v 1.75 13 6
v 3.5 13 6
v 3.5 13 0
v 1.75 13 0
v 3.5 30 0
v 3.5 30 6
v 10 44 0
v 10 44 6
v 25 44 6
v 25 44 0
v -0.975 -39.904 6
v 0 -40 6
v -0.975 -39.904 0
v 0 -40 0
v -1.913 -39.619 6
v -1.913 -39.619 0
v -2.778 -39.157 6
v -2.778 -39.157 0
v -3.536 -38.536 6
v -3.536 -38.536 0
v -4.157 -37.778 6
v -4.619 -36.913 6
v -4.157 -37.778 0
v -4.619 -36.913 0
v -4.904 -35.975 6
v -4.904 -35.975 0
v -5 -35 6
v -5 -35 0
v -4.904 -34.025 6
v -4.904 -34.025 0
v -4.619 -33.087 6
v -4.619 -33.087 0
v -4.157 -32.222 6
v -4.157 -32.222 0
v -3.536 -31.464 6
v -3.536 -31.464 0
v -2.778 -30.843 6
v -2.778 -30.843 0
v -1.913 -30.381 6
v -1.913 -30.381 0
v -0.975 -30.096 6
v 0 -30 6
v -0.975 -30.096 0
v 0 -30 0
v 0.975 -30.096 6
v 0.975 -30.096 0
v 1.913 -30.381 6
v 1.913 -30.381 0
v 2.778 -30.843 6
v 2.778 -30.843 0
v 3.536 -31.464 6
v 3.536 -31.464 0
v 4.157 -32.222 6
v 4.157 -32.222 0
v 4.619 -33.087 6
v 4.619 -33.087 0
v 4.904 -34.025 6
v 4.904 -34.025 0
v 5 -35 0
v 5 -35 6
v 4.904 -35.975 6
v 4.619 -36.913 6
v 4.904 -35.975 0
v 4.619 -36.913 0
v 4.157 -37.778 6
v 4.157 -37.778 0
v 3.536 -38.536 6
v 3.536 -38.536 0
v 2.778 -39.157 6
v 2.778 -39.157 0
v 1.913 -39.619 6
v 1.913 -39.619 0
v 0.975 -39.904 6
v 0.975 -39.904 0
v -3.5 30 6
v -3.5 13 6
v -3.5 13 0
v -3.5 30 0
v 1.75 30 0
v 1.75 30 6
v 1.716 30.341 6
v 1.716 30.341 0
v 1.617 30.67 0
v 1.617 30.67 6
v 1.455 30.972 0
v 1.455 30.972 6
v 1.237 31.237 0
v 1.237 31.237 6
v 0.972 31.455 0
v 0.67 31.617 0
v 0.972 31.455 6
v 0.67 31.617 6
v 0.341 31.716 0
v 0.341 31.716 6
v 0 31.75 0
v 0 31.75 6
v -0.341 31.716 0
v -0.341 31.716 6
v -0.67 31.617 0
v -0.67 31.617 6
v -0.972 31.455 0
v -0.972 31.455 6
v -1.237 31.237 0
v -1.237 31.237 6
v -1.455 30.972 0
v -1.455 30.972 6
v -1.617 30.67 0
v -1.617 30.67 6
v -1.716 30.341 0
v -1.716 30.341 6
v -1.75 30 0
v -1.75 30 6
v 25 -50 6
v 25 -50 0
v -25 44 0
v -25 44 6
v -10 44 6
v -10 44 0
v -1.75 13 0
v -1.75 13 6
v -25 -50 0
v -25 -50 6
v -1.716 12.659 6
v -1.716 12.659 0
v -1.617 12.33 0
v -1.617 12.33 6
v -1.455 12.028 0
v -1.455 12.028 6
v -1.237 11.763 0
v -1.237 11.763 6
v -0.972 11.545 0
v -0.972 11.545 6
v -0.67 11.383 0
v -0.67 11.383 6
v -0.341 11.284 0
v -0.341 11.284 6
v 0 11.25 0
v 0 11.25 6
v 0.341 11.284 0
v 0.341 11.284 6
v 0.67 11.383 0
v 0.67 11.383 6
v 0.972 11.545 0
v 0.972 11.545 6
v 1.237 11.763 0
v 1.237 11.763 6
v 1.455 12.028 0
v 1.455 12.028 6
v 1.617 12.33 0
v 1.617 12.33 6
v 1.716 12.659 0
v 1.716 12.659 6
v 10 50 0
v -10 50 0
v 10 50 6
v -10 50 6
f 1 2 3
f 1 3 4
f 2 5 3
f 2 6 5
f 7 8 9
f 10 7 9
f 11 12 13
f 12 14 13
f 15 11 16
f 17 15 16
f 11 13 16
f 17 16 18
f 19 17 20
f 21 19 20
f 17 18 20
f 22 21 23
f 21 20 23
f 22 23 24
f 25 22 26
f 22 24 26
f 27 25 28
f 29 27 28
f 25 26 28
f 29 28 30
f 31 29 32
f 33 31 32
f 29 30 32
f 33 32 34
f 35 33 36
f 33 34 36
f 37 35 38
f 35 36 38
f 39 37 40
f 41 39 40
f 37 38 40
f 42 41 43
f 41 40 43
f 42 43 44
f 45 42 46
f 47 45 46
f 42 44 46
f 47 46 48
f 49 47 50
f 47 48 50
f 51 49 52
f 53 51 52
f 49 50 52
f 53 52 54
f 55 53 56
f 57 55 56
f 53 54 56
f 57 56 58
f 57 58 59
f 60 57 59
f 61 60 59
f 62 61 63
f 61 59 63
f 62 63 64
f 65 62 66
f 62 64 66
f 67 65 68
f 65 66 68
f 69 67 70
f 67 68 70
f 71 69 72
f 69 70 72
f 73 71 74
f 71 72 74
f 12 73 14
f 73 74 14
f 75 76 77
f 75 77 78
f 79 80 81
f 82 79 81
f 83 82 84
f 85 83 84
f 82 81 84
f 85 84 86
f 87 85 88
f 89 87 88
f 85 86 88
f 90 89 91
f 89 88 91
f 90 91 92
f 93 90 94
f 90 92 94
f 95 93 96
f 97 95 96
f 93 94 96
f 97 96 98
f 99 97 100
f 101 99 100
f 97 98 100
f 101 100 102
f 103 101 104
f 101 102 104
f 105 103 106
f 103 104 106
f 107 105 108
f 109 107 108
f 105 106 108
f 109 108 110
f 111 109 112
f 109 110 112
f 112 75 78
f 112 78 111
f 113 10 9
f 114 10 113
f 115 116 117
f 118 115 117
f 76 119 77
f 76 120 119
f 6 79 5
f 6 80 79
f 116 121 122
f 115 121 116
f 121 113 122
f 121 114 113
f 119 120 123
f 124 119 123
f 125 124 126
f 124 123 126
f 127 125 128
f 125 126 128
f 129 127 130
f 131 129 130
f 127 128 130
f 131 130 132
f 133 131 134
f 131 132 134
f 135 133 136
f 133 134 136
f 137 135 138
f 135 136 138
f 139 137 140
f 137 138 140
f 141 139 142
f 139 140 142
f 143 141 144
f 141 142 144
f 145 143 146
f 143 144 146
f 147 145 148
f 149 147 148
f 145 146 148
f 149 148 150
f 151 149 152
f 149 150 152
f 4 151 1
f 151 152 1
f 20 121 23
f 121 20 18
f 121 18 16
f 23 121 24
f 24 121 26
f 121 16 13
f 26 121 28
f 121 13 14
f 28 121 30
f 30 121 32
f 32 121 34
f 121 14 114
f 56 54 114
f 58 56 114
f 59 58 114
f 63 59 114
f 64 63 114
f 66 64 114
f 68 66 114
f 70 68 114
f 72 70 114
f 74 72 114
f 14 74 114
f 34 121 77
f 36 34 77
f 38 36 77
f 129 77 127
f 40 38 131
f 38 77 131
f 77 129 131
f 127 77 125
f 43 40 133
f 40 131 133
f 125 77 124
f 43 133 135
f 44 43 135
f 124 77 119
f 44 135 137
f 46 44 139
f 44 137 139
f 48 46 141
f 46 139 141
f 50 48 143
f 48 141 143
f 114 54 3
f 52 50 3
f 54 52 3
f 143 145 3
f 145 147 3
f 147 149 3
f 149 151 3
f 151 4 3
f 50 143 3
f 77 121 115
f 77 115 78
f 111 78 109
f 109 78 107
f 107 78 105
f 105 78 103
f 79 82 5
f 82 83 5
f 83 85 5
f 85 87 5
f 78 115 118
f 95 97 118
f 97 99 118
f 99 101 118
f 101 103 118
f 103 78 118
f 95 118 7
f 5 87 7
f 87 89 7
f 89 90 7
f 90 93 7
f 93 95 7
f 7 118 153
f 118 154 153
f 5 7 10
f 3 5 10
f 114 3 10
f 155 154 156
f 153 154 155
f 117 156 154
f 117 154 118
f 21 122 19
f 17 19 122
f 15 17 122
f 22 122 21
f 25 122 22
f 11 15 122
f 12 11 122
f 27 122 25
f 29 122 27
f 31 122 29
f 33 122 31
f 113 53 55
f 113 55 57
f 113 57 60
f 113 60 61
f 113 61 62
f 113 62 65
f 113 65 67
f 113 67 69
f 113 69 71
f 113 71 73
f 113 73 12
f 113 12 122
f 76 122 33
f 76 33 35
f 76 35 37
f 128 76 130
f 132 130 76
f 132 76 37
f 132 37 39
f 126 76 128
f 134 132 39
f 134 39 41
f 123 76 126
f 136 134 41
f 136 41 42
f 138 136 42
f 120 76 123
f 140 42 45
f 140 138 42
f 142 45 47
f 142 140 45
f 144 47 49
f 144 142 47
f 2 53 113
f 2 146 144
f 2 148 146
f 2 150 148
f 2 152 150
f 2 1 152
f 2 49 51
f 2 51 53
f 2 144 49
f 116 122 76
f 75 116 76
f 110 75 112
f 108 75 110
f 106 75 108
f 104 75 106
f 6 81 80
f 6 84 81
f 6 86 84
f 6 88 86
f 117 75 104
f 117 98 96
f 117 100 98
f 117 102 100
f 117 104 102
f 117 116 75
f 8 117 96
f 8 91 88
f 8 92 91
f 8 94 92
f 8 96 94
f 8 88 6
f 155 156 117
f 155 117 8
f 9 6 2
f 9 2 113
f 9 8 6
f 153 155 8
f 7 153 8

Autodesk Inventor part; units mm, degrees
ref_plane "YZ Plane" through (0, 0, 0) normal (1, 0, 0) x (0, 1, 0)
ref_plane "XZ Plane" through (0, 0, 0) normal (0, 1, 0) x (-1, 0, 0)
ref_plane "XY Plane" through (0, 0, 0) normal (0, 0, 1) x (1, 0, 0)
sketch "Sketch1" plane through (0, 0, 0) normal (0, 0, 1) x (1, 0, 0)
  line L0 (-25, 50) -> (25, 50)
  line L1 (25, 50) -> (25, -50)
  line L2 (25, -50) -> (-25, -50)
  line L3 (-25, -50) -> (-25, 50)
  line L4 (-25, 0) -> (25, 0) construction
  point P0 (0, 0)
  point P1 (0, 0)
  dimension "d0" = 50
  dimension "d1" = 100
extrude "Extrusion1" add sketch "Sketch1" along normal blind 6
sketch "Sketch2" plane through (0, 0, 6) normal (0, 0, 1) x (1, 0, 0)
  line L0 (-25, 50) -> (25, 50) projected
  line L1 (25, -50) -> (-25, -50) projected
  line L2 (0, 50) -> (0, -35) construction
  point P0 (0, 0)
  dimension "d4" = 15
hole "Hole1" at (0, -35, 6) direction (0, 0, -1) diameter 10 end through all
sketch "Sketch3" plane through (0, 0, 6) normal (0, 0, 1) x (1, 0, 0)
  line L0 (-25, 50) -> (25, 50) projected
  line L1 (-3.5, 30) -> (3.5, 30)
  line L2 (3.5, 30) -> (3.5, 13)
  line L3 (3.5, 13) -> (-3.5, 13)
  line L4 (-3.5, 13) -> (-3.5, 30)
  line L5 (0, 30) -> (0, 13) construction
  circle A0 centre (0, 30) radius 1.75
  circle A1 centre (0, 13) radius 1.75
  point P0 (0, 0)
  dimension "d12" = 7
  dimension "d13" = 17
  dimension "d14" = 3.5
  dimension "d15" = 3.5
  dimension "d16" = 20
extrude "Extrusion2" cut sketch "Sketch3" against normal up to next
sketch "Sketch4" plane through (0, 0, 6) normal (0, 0, 1) x (1, 0, 0)
  arc A0 (1.75, 30) -> (-1.75, 30) centre (0, 30) ccw projected
  line L0 (-25, 50) -> (25, 50) projected
  line L1 (-25, -50) -> (-25, 50) projected
  line L2 (10, 44) -> (25, 44) projected
  line L3 (25, 50) -> (25, 44) projected
  line L4 (10, 50) -> (25, 50) projected
  line L5 (10, 50) -> (10, 44) projected
  line L6 (-25, 44) -> (-10, 44) projected
  line L7 (-10, 50) -> (-10, 44) projected
  line L8 (-25, 50) -> (-10, 50) projected
  line L9 (-25, 50) -> (-25, 44) projected
  line L10 (0, 50) -> (0, 31.75) construction
  point P0 (0, 0)
extrude "Extrusion3" cut sketch "Sketch4" against normal up to next
properties part number "TOP"
